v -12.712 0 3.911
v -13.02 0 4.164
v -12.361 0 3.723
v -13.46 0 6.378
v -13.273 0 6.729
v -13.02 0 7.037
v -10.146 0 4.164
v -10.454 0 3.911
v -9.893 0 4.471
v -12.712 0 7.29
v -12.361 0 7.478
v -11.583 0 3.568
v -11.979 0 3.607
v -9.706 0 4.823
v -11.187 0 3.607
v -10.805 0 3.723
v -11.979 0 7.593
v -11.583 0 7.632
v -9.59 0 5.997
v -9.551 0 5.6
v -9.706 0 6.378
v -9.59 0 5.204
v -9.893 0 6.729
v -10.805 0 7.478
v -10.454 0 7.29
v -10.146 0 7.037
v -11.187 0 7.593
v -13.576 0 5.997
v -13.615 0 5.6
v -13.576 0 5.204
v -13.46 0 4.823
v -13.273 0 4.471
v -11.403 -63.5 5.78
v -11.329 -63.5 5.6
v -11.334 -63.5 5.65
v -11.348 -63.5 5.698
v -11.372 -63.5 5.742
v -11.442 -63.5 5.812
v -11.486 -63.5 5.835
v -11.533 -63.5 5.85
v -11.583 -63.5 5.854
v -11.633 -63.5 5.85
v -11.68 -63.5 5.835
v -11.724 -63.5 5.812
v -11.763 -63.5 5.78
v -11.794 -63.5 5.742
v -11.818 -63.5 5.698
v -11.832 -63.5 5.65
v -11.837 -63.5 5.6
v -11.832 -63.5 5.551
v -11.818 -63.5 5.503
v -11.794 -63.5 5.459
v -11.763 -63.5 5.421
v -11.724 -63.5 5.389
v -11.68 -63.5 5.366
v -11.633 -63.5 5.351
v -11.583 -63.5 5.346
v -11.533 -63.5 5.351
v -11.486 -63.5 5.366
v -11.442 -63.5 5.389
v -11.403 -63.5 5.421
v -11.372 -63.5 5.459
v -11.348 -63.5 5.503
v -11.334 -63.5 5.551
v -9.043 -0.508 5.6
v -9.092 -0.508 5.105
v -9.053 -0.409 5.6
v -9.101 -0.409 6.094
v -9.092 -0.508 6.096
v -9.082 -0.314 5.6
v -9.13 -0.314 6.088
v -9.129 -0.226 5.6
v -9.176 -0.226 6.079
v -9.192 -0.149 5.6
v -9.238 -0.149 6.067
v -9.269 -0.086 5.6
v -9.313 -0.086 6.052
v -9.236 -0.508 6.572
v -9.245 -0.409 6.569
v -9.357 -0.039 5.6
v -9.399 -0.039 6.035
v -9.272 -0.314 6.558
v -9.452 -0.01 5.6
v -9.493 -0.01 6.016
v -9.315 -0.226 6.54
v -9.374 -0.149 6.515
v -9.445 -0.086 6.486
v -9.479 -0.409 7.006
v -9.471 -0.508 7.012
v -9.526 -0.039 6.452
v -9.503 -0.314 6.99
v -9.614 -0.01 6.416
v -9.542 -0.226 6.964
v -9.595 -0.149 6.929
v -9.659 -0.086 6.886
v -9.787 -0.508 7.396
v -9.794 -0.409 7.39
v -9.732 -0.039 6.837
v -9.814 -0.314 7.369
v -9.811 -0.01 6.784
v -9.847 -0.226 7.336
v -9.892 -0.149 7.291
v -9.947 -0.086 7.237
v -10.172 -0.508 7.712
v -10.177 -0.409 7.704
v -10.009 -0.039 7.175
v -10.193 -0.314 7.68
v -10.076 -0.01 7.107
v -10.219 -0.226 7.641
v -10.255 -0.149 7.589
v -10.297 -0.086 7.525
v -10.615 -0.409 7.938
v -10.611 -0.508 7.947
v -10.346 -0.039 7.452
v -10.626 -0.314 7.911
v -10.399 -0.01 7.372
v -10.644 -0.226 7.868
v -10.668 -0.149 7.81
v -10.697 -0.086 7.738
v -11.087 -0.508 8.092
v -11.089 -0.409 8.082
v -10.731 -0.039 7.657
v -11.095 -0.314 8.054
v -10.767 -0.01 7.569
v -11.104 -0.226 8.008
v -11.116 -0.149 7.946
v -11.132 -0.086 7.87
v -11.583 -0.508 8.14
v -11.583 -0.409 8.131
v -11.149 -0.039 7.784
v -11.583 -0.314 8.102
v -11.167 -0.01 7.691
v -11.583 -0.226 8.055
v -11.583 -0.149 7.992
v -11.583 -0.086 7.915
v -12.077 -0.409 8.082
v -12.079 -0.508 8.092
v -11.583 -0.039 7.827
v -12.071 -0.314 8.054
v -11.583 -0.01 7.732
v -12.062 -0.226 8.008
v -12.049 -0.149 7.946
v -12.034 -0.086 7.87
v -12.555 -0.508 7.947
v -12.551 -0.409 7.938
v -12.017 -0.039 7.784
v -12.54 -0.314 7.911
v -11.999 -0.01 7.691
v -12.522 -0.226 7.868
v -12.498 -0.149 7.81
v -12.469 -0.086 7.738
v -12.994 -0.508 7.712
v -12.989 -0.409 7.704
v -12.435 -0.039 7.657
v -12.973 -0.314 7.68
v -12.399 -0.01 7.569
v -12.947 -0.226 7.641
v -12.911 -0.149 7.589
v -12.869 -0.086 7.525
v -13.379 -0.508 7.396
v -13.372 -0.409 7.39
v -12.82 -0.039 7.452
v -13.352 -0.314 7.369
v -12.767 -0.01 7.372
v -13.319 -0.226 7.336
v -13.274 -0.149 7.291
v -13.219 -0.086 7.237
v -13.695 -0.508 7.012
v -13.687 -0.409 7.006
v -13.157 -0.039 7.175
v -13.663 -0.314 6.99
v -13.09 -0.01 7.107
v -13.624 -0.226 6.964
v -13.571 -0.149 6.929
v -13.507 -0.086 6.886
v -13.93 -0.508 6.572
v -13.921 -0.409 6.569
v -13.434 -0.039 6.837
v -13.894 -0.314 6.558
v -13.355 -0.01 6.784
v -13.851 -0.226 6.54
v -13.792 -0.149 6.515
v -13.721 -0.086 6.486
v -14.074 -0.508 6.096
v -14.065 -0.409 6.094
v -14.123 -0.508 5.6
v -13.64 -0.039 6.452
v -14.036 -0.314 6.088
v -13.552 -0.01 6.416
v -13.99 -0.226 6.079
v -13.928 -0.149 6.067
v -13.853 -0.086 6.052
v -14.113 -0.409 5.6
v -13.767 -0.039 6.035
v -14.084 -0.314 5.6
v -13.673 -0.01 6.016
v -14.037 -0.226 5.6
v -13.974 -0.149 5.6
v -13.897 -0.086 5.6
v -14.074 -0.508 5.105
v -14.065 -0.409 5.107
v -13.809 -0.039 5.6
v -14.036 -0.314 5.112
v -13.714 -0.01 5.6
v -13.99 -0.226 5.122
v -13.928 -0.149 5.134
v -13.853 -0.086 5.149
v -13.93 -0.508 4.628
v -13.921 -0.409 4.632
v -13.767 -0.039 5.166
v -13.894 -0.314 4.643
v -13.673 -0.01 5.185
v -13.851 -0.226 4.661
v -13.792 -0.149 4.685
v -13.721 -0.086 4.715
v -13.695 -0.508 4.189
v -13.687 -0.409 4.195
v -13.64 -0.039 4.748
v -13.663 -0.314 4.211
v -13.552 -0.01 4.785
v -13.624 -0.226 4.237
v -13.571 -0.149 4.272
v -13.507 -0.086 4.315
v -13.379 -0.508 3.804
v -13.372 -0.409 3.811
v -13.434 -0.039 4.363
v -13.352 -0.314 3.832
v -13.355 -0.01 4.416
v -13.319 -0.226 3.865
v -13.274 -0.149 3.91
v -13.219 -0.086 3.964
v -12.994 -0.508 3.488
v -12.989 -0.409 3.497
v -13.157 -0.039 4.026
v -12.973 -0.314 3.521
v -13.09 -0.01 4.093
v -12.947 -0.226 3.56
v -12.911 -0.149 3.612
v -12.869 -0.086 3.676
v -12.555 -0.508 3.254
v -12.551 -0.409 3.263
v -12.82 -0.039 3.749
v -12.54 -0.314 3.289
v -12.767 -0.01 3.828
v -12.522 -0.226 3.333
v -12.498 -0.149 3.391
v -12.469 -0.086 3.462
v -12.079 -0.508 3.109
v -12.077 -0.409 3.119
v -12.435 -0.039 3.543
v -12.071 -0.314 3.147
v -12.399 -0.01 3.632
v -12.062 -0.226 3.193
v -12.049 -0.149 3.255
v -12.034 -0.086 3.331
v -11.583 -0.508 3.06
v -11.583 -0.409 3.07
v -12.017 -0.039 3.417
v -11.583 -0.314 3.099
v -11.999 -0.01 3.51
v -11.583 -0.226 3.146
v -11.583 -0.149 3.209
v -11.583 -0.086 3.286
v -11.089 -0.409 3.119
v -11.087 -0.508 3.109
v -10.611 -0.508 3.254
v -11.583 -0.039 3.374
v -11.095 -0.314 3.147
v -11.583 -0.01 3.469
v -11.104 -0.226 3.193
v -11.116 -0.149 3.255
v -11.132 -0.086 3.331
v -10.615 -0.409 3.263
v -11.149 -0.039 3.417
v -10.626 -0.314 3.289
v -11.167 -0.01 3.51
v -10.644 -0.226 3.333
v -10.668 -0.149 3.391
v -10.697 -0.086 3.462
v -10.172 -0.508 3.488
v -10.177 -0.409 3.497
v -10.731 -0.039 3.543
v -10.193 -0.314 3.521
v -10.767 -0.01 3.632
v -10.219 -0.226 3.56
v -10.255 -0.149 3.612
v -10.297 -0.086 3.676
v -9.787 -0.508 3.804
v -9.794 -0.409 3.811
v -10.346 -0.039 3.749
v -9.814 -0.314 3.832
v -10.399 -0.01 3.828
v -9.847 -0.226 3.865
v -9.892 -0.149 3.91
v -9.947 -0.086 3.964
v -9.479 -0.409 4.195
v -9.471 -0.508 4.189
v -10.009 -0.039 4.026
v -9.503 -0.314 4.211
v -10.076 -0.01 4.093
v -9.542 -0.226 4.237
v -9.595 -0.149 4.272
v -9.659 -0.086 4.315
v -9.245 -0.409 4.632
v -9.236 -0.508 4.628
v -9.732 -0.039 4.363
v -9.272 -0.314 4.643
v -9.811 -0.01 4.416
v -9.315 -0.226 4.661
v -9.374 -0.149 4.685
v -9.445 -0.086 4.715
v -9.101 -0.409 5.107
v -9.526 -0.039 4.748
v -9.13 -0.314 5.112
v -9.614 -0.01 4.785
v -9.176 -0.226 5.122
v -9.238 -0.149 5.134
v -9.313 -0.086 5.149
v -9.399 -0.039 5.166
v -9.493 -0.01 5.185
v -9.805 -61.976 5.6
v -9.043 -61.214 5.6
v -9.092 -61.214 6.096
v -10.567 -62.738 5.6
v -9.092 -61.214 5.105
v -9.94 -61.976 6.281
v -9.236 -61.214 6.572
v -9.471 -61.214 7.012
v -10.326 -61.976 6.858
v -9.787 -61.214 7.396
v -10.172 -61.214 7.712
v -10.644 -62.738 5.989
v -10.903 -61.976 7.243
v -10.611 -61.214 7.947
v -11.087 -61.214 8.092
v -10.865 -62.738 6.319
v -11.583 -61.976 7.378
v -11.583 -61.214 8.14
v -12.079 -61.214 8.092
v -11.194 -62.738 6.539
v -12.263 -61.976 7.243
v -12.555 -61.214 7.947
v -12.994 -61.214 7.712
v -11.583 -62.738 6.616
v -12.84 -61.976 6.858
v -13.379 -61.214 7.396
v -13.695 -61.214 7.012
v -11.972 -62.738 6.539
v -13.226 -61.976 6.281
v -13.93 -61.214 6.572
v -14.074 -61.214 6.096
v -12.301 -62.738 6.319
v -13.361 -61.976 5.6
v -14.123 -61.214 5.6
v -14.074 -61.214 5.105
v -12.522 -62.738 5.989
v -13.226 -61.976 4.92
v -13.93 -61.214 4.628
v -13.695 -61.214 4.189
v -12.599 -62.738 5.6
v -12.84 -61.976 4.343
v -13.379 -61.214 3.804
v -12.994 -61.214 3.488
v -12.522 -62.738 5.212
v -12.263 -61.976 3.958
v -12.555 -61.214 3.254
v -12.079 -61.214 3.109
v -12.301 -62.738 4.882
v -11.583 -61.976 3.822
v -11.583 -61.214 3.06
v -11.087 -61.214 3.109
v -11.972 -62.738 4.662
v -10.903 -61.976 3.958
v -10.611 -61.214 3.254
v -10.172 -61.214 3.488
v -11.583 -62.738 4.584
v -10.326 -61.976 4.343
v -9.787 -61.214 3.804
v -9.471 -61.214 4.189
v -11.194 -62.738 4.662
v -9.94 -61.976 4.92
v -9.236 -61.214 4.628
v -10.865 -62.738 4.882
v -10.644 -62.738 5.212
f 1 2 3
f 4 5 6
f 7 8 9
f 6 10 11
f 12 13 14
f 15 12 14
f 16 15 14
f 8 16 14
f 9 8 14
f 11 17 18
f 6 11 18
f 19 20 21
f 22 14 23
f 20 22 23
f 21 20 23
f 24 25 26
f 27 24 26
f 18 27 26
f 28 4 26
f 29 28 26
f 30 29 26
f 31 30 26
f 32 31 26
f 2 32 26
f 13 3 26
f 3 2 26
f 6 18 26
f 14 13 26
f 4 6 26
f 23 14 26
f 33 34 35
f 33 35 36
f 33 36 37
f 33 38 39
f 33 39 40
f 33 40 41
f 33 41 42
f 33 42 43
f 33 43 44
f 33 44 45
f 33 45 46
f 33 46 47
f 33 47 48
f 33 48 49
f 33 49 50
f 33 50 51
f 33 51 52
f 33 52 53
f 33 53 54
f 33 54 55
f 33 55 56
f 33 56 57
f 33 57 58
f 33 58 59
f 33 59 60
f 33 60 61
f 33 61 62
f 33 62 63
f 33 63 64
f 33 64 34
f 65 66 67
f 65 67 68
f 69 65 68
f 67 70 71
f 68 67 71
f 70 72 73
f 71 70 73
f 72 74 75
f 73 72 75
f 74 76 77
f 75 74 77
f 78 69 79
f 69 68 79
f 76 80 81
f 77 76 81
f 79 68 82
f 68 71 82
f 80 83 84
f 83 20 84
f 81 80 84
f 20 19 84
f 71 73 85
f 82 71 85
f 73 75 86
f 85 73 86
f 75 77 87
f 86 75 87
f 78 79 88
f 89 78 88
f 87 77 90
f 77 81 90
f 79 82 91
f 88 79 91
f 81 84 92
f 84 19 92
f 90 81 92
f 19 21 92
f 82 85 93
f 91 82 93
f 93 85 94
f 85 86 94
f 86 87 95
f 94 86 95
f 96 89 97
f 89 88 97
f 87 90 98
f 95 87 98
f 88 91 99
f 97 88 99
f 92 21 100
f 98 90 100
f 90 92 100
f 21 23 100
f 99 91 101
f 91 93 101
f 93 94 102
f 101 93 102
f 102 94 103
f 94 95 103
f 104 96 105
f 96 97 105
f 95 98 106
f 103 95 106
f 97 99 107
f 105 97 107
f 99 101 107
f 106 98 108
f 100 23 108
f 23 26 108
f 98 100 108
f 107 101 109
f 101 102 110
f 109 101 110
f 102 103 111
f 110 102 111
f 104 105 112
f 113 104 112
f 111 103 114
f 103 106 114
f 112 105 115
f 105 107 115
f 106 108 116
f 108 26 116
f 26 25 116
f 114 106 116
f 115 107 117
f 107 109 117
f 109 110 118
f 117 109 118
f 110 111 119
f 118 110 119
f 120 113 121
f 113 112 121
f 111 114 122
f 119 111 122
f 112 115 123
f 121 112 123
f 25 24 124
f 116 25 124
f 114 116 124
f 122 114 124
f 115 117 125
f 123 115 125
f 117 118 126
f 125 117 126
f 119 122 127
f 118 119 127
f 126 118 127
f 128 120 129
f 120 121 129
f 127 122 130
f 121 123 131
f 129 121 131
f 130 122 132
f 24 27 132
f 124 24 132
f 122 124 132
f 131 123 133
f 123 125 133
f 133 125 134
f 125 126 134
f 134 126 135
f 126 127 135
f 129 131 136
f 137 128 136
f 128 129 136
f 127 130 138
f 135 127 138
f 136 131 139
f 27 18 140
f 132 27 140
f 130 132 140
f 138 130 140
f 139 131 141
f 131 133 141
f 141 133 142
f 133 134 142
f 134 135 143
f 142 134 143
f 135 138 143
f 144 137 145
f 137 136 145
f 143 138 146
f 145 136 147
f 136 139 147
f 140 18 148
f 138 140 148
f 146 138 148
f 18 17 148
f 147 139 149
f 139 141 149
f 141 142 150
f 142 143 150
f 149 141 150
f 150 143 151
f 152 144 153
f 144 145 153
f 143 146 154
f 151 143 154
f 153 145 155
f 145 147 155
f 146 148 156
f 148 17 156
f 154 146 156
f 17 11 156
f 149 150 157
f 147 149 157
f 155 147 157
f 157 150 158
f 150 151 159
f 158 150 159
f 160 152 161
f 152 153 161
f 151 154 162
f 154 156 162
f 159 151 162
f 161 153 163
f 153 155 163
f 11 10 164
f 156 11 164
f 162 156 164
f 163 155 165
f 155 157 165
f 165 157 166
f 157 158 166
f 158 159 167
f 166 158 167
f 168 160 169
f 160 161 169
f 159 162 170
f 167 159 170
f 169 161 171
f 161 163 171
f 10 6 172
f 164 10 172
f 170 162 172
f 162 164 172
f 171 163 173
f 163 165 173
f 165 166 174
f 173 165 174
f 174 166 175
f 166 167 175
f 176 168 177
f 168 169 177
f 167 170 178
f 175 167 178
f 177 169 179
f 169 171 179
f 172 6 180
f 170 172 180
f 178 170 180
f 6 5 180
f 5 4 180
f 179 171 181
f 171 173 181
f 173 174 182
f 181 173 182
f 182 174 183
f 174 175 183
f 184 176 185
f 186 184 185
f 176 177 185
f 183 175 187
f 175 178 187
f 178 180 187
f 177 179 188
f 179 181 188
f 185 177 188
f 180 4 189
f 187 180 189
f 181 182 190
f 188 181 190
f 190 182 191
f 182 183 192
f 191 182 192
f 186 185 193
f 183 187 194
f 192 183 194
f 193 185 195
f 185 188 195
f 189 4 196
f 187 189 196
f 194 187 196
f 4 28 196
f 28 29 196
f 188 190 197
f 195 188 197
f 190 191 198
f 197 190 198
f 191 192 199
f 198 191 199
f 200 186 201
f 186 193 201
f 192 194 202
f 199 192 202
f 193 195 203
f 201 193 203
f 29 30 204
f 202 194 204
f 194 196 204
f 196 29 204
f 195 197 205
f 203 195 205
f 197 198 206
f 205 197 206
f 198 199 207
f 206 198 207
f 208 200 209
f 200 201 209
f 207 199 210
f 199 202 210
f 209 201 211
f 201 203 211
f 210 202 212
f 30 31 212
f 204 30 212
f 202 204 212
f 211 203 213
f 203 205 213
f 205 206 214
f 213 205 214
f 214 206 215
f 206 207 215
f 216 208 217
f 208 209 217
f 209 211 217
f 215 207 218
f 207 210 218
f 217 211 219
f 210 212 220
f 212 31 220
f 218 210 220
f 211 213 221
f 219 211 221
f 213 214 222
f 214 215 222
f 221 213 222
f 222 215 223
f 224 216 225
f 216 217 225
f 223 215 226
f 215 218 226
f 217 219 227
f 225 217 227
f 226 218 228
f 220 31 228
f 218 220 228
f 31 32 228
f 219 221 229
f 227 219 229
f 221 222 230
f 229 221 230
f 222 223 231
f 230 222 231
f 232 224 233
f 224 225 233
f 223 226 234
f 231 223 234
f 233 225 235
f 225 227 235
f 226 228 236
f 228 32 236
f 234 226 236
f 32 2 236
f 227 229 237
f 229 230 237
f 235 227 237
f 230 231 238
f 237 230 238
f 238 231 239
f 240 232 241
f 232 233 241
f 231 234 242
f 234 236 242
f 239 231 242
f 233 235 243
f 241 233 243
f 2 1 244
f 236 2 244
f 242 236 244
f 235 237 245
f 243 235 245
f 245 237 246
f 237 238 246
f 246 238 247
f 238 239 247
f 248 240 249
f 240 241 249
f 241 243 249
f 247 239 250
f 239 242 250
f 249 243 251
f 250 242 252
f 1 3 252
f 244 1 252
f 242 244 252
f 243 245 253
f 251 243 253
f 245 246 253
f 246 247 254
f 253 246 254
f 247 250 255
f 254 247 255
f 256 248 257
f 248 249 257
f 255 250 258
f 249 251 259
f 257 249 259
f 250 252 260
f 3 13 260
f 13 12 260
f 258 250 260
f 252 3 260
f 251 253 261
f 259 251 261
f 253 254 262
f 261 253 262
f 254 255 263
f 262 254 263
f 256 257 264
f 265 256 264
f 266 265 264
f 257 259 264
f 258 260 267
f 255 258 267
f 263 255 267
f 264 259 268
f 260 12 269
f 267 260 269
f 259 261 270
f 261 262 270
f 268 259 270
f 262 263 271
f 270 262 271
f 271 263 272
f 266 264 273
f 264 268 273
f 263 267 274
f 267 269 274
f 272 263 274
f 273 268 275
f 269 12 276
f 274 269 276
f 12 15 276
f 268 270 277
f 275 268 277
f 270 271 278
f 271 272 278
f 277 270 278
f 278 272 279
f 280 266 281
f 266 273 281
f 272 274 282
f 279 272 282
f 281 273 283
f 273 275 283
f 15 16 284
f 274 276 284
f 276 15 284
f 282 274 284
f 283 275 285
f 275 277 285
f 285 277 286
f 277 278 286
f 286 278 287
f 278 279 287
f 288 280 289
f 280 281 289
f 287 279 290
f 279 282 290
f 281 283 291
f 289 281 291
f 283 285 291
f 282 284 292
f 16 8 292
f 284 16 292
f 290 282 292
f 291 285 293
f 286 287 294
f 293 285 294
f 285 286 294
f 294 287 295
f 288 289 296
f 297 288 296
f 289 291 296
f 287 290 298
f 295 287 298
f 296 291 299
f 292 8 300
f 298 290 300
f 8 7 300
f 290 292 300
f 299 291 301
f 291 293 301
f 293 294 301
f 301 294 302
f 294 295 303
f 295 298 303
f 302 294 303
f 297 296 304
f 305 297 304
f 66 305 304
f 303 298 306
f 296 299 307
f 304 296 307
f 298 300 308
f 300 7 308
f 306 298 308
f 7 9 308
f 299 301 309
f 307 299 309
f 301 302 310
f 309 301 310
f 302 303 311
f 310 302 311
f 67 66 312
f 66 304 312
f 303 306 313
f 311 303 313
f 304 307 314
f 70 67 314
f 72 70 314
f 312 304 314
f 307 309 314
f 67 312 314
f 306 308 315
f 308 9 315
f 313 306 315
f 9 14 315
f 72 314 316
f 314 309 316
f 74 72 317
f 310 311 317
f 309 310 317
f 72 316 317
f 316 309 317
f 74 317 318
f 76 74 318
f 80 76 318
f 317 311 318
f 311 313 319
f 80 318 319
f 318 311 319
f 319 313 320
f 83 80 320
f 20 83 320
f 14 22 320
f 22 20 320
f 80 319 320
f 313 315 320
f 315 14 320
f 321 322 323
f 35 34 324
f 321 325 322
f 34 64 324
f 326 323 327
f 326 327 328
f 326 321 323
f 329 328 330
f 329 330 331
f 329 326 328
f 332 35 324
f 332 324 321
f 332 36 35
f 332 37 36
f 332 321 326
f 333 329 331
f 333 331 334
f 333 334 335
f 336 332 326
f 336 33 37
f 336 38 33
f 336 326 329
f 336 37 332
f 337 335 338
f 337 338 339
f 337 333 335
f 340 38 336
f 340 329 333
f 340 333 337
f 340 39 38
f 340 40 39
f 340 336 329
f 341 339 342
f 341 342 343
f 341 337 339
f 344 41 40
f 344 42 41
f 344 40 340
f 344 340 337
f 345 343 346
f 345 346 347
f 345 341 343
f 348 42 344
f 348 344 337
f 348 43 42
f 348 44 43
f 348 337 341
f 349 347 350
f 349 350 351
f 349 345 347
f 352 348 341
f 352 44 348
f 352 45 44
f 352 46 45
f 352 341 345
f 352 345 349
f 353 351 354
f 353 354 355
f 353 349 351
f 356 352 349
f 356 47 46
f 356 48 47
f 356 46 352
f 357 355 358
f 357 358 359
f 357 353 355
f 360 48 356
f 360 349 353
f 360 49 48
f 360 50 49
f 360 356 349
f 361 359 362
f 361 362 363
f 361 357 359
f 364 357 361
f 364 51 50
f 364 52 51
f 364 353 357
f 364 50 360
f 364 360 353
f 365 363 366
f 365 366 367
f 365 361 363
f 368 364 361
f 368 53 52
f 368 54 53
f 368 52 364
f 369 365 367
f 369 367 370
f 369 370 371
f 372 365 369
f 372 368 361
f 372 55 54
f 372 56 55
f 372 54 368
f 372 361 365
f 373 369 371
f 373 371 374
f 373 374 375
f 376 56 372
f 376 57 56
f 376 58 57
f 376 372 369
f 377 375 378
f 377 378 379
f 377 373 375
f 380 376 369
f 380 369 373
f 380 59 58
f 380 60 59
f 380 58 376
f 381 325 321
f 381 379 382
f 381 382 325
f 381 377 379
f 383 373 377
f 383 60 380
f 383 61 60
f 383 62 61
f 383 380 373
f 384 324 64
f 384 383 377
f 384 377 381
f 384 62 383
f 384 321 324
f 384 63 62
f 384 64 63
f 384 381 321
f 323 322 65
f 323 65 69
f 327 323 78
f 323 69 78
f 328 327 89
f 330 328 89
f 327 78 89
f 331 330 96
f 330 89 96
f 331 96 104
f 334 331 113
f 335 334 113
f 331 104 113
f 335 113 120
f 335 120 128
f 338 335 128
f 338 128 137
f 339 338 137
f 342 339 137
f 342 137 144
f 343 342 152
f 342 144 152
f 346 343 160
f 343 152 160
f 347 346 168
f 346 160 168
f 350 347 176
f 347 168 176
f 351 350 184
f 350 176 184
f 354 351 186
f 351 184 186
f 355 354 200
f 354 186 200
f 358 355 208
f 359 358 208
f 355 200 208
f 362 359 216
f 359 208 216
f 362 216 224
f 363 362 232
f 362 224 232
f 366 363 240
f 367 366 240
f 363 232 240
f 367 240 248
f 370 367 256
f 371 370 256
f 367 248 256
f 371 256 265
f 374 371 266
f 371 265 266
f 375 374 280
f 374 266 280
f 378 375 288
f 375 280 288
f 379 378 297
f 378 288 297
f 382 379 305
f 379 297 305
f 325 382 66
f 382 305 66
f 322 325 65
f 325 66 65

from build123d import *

# Parameters (mm, degrees)
F0_R     = 2.54
F1_DEPTH = 63.5
F2_R     = 0.508
F3_SIZE  = 2.286


with BuildPart() as f1:
    # F0 (on Front) → F1 (new body)
    with BuildSketch(Plane.XZ):
        with Locations((-11.582997, 5.600415)):
            Circle(F0_R)
    extrude(amount=F1_DEPTH)

    # F2
    f2_edges = [f1.edges().sort_by_distance(p)[0] for p in [
        (-14.122997, 0, 5.600415),
    ]]
    fillet(f2_edges, radius=F2_R)

    # F3
    f3_edges = [f1.edges().sort_by_distance(p)[0] for p in [
        (-14.122997, -63.5, 5.600415),
    ]]
    chamfer(f3_edges, length=F3_SIZE)


solid = f1.part
